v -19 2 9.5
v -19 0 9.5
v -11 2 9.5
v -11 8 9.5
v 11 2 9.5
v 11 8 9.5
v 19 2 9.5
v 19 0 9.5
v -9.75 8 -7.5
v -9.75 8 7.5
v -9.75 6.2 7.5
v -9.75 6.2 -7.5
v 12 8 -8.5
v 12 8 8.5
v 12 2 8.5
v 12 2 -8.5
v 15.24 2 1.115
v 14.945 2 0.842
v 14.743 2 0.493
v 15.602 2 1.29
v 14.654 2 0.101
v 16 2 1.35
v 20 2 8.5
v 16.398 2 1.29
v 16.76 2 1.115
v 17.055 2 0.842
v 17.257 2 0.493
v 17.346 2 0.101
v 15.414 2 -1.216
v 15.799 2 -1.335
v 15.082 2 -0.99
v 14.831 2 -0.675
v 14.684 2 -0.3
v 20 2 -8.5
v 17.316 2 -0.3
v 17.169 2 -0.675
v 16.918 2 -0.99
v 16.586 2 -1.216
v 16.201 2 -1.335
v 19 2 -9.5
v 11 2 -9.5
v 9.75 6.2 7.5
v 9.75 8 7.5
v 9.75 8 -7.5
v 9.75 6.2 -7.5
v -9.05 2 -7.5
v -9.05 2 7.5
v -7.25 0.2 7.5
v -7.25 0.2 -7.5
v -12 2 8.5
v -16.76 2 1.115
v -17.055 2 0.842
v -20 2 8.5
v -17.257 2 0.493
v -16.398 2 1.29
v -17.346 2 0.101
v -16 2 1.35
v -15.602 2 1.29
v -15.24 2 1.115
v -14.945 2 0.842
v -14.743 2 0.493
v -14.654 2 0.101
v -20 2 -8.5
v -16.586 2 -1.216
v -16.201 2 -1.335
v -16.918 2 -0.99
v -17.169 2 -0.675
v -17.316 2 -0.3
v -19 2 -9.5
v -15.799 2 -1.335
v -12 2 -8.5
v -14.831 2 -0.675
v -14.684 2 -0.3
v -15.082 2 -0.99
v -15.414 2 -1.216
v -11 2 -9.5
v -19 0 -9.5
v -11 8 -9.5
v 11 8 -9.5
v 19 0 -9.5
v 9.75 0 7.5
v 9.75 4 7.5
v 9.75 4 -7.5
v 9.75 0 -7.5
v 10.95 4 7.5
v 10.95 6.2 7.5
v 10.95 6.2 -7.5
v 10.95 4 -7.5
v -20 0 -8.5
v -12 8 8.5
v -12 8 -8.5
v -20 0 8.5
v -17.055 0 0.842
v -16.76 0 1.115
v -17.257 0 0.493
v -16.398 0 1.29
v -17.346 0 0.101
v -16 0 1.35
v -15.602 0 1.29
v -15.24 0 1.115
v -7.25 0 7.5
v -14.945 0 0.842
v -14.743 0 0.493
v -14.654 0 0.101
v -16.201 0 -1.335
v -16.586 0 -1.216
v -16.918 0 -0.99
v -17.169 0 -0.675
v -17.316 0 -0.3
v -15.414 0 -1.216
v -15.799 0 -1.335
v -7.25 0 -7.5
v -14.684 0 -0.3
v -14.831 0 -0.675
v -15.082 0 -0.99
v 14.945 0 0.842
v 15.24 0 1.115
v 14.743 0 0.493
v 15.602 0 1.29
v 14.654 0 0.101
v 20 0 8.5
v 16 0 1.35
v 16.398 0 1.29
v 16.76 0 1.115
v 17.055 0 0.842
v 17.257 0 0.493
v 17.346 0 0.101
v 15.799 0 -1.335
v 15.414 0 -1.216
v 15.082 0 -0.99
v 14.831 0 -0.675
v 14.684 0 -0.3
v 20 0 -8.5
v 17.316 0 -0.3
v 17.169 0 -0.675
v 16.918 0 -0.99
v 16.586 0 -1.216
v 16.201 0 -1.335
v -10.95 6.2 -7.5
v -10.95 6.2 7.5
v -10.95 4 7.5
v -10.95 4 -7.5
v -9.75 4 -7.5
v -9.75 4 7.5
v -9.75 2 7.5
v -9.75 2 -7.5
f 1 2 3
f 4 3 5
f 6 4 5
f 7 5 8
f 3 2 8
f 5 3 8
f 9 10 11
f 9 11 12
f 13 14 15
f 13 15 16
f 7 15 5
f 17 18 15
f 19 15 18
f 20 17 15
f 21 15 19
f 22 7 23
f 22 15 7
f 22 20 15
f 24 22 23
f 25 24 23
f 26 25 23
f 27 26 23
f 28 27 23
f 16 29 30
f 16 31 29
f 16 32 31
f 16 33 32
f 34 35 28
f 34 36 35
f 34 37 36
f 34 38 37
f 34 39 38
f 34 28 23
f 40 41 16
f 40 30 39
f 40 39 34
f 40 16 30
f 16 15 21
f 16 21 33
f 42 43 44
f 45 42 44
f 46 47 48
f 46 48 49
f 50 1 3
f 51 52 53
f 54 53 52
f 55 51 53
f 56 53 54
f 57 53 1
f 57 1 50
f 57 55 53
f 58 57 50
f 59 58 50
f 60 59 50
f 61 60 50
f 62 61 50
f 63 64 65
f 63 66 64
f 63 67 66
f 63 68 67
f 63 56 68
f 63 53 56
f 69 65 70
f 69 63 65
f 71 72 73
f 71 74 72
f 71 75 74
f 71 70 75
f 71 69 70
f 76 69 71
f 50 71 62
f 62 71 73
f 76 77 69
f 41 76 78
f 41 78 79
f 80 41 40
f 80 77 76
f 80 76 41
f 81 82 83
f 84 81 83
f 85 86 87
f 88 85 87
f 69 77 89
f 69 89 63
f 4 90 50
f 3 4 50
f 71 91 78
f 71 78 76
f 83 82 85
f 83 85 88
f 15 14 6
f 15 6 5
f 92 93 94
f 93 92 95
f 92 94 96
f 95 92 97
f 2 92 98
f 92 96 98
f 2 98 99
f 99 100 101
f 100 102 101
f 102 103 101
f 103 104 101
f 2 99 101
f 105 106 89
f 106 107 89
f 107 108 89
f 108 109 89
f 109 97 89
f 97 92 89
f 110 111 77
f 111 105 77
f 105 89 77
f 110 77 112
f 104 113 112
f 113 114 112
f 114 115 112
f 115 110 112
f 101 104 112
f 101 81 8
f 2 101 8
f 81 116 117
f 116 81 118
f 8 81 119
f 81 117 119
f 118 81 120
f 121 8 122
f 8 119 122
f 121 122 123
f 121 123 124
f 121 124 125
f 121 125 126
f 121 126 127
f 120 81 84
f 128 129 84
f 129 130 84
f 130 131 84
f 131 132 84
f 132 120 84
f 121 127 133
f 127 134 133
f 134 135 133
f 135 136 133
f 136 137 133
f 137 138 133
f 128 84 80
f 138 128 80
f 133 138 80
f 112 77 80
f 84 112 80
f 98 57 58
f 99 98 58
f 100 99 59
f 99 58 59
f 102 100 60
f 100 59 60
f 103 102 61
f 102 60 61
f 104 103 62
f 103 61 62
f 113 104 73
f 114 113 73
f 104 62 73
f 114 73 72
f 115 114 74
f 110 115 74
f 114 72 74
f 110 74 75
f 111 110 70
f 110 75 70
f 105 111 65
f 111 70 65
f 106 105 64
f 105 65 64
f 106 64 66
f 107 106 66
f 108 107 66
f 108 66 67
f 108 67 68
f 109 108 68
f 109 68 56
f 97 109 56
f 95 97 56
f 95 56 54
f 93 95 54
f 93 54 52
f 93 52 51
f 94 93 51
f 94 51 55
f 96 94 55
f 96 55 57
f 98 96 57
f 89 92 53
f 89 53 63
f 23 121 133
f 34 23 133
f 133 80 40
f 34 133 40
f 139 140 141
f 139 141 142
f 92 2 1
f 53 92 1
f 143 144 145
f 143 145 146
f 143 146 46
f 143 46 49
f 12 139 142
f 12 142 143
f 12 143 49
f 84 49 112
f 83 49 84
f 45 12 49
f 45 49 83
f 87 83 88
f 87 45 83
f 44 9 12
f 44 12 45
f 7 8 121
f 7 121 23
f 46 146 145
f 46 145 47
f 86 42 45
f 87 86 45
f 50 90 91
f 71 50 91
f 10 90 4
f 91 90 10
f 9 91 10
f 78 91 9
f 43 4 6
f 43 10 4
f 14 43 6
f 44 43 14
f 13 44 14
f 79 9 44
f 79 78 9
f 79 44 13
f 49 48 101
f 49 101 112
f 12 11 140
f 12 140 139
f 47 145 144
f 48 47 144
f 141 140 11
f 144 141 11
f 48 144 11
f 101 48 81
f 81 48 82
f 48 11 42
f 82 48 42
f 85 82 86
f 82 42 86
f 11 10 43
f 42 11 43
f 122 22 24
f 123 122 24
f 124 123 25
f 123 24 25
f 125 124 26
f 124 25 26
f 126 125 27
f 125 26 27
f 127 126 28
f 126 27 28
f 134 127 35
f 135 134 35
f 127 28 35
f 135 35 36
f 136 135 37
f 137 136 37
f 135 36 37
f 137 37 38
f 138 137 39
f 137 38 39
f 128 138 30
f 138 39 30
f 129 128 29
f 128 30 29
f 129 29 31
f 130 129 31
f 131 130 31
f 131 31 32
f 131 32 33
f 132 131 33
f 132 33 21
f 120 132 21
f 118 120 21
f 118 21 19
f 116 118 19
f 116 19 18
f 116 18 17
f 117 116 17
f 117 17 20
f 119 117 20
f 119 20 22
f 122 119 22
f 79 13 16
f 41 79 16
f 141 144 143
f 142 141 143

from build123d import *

# Parameters (mm, degrees)
SKETCH_1_W          = 40
SKETCH_1_H          = 19
EXTRUDE_1_DEPTH     = 8
SKETCH_2_W          = 42
SKETCH_2_H          = 21
SKETCH_2_W_2        = 24
SKETCH_2_H_2        = 19
CUT_EXTRUDE_1_DEPTH = 6
SKETCH_3_W          = 19.5
SKETCH_3_H          = 15
CUT_EXTRUDE_2_DEPTH = 6
SKETCH_5_W          = 17
SKETCH_5_H          = 15
CUT_EXTRUDE_3_DEPTH = 8
SKETCH_6_W          = 15
SKETCH_6_H          = 2.2
CUT_EXTRUDE_4_DEPTH = 1.2
CHAMFER_1_SIZE      = 1.8
CHAMFER_2_SIZE      = 1
CHAMFER_3_SIZE      = 1
SKETCH_7_R          = 1.35
CUT_EXTRUDE_5_DEPTH = 23.940139494


with BuildPart() as part:
    # Эскиз1 → Бобышка-Вытянуть1 (new body)
    with BuildSketch(Plane(origin=(0, 0, 0), x_dir=(1, 0, 0), z_dir=(0, 1, 0))):
        Rectangle(SKETCH_1_W, SKETCH_1_H)
    extrude(amount=EXTRUDE_1_DEPTH)

    # Эскиз2 → Вырез-Вытянуть1 (cut)
    with BuildSketch(Plane(origin=(0, 8, 0), x_dir=(1, 0, 0), z_dir=(0, 1, 0))):
        Rectangle(SKETCH_2_W, SKETCH_2_H)
        Rectangle(SKETCH_2_W_2, SKETCH_2_H_2, mode=Mode.SUBTRACT)
    extrude(amount=-CUT_EXTRUDE_1_DEPTH, mode=Mode.SUBTRACT)

    # Эскиз3 → Вырез-Вытянуть2 (cut)
    with BuildSketch(Plane(origin=(0, 8, 0), x_dir=(1, 0, 0), z_dir=(0, 1, 0))):
        Rectangle(SKETCH_3_W, SKETCH_3_H)
    extrude(amount=-CUT_EXTRUDE_2_DEPTH, mode=Mode.SUBTRACT)

    # Эскиз5 → Вырез-Вытянуть3 (cut)
    with BuildSketch(Plane(origin=(0, 2, 0), x_dir=(1, 0, 0), z_dir=(0, 1, 0))):
        with Locations((1.25, 0)):
            Rectangle(SKETCH_5_W, SKETCH_5_H)
    extrude(amount=-CUT_EXTRUDE_3_DEPTH, mode=Mode.SUBTRACT)

    # Эскиз6 → Вырез-Вытянуть4 (cut)
    with BuildSketch(Plane(origin=(-9.75, 0, 0), x_dir=(0, 0, -1), z_dir=(1, 0, 0))):
        with Locations((0, 5.1)):
            Rectangle(SKETCH_6_W, SKETCH_6_H)
    cut_extrude_4 = extrude(amount=-CUT_EXTRUDE_4_DEPTH, mode=Mode.SUBTRACT)

    # Зеркальное отражение1: Вырез-Вытянуть4 across plane
    add(cut_extrude_4.mirror(Plane(origin=(0, 0, 0), x_dir=(0, 0, 1), z_dir=(1, 0, 0))), mode=Mode.SUBTRACT)

    # Фаска1
    chamfer_1_edges = [part.edges().sort_by_distance(p)[0] for p in [
        (-7.25, 2, 0),
    ]]
    chamfer(chamfer_1_edges, length=CHAMFER_1_SIZE)

    # Фаска2
    chamfer_2_edges = [part.edges().sort_by_distance(p)[0] for p in [
        (-12, 5, -9.5),
        (12, 5, -9.5),
        (12, 5, 9.5),
        (-12, 5, 9.5),
    ]]
    chamfer(chamfer_2_edges, length=CHAMFER_2_SIZE)

    # Фаска3
    chamfer_3_edges = [part.edges().sort_by_distance(p)[0] for p in [
        (-20, 1, -9.5),
        (20, 1, -9.5),
        (20, 1, 9.5),
        (-20, 1, 9.5),
    ]]
    chamfer(chamfer_3_edges, length=CHAMFER_3_SIZE)

    # Эскиз7 → Вырез-Вытянуть5 (cut, through all)
    with BuildSketch(Plane(origin=(0, 2, 0), x_dir=(1, 0, 0), z_dir=(0, 1, 0))):
        with Locations(Location((-16, 0, 0), (0, 0, 270))):
            Circle(SKETCH_7_R)
        with Locations(Location((16, 0, 0), (0, 0, 270))):
            Circle(SKETCH_7_R)
    extrude(amount=-CUT_EXTRUDE_5_DEPTH, mode=Mode.SUBTRACT)


solid = part.part
